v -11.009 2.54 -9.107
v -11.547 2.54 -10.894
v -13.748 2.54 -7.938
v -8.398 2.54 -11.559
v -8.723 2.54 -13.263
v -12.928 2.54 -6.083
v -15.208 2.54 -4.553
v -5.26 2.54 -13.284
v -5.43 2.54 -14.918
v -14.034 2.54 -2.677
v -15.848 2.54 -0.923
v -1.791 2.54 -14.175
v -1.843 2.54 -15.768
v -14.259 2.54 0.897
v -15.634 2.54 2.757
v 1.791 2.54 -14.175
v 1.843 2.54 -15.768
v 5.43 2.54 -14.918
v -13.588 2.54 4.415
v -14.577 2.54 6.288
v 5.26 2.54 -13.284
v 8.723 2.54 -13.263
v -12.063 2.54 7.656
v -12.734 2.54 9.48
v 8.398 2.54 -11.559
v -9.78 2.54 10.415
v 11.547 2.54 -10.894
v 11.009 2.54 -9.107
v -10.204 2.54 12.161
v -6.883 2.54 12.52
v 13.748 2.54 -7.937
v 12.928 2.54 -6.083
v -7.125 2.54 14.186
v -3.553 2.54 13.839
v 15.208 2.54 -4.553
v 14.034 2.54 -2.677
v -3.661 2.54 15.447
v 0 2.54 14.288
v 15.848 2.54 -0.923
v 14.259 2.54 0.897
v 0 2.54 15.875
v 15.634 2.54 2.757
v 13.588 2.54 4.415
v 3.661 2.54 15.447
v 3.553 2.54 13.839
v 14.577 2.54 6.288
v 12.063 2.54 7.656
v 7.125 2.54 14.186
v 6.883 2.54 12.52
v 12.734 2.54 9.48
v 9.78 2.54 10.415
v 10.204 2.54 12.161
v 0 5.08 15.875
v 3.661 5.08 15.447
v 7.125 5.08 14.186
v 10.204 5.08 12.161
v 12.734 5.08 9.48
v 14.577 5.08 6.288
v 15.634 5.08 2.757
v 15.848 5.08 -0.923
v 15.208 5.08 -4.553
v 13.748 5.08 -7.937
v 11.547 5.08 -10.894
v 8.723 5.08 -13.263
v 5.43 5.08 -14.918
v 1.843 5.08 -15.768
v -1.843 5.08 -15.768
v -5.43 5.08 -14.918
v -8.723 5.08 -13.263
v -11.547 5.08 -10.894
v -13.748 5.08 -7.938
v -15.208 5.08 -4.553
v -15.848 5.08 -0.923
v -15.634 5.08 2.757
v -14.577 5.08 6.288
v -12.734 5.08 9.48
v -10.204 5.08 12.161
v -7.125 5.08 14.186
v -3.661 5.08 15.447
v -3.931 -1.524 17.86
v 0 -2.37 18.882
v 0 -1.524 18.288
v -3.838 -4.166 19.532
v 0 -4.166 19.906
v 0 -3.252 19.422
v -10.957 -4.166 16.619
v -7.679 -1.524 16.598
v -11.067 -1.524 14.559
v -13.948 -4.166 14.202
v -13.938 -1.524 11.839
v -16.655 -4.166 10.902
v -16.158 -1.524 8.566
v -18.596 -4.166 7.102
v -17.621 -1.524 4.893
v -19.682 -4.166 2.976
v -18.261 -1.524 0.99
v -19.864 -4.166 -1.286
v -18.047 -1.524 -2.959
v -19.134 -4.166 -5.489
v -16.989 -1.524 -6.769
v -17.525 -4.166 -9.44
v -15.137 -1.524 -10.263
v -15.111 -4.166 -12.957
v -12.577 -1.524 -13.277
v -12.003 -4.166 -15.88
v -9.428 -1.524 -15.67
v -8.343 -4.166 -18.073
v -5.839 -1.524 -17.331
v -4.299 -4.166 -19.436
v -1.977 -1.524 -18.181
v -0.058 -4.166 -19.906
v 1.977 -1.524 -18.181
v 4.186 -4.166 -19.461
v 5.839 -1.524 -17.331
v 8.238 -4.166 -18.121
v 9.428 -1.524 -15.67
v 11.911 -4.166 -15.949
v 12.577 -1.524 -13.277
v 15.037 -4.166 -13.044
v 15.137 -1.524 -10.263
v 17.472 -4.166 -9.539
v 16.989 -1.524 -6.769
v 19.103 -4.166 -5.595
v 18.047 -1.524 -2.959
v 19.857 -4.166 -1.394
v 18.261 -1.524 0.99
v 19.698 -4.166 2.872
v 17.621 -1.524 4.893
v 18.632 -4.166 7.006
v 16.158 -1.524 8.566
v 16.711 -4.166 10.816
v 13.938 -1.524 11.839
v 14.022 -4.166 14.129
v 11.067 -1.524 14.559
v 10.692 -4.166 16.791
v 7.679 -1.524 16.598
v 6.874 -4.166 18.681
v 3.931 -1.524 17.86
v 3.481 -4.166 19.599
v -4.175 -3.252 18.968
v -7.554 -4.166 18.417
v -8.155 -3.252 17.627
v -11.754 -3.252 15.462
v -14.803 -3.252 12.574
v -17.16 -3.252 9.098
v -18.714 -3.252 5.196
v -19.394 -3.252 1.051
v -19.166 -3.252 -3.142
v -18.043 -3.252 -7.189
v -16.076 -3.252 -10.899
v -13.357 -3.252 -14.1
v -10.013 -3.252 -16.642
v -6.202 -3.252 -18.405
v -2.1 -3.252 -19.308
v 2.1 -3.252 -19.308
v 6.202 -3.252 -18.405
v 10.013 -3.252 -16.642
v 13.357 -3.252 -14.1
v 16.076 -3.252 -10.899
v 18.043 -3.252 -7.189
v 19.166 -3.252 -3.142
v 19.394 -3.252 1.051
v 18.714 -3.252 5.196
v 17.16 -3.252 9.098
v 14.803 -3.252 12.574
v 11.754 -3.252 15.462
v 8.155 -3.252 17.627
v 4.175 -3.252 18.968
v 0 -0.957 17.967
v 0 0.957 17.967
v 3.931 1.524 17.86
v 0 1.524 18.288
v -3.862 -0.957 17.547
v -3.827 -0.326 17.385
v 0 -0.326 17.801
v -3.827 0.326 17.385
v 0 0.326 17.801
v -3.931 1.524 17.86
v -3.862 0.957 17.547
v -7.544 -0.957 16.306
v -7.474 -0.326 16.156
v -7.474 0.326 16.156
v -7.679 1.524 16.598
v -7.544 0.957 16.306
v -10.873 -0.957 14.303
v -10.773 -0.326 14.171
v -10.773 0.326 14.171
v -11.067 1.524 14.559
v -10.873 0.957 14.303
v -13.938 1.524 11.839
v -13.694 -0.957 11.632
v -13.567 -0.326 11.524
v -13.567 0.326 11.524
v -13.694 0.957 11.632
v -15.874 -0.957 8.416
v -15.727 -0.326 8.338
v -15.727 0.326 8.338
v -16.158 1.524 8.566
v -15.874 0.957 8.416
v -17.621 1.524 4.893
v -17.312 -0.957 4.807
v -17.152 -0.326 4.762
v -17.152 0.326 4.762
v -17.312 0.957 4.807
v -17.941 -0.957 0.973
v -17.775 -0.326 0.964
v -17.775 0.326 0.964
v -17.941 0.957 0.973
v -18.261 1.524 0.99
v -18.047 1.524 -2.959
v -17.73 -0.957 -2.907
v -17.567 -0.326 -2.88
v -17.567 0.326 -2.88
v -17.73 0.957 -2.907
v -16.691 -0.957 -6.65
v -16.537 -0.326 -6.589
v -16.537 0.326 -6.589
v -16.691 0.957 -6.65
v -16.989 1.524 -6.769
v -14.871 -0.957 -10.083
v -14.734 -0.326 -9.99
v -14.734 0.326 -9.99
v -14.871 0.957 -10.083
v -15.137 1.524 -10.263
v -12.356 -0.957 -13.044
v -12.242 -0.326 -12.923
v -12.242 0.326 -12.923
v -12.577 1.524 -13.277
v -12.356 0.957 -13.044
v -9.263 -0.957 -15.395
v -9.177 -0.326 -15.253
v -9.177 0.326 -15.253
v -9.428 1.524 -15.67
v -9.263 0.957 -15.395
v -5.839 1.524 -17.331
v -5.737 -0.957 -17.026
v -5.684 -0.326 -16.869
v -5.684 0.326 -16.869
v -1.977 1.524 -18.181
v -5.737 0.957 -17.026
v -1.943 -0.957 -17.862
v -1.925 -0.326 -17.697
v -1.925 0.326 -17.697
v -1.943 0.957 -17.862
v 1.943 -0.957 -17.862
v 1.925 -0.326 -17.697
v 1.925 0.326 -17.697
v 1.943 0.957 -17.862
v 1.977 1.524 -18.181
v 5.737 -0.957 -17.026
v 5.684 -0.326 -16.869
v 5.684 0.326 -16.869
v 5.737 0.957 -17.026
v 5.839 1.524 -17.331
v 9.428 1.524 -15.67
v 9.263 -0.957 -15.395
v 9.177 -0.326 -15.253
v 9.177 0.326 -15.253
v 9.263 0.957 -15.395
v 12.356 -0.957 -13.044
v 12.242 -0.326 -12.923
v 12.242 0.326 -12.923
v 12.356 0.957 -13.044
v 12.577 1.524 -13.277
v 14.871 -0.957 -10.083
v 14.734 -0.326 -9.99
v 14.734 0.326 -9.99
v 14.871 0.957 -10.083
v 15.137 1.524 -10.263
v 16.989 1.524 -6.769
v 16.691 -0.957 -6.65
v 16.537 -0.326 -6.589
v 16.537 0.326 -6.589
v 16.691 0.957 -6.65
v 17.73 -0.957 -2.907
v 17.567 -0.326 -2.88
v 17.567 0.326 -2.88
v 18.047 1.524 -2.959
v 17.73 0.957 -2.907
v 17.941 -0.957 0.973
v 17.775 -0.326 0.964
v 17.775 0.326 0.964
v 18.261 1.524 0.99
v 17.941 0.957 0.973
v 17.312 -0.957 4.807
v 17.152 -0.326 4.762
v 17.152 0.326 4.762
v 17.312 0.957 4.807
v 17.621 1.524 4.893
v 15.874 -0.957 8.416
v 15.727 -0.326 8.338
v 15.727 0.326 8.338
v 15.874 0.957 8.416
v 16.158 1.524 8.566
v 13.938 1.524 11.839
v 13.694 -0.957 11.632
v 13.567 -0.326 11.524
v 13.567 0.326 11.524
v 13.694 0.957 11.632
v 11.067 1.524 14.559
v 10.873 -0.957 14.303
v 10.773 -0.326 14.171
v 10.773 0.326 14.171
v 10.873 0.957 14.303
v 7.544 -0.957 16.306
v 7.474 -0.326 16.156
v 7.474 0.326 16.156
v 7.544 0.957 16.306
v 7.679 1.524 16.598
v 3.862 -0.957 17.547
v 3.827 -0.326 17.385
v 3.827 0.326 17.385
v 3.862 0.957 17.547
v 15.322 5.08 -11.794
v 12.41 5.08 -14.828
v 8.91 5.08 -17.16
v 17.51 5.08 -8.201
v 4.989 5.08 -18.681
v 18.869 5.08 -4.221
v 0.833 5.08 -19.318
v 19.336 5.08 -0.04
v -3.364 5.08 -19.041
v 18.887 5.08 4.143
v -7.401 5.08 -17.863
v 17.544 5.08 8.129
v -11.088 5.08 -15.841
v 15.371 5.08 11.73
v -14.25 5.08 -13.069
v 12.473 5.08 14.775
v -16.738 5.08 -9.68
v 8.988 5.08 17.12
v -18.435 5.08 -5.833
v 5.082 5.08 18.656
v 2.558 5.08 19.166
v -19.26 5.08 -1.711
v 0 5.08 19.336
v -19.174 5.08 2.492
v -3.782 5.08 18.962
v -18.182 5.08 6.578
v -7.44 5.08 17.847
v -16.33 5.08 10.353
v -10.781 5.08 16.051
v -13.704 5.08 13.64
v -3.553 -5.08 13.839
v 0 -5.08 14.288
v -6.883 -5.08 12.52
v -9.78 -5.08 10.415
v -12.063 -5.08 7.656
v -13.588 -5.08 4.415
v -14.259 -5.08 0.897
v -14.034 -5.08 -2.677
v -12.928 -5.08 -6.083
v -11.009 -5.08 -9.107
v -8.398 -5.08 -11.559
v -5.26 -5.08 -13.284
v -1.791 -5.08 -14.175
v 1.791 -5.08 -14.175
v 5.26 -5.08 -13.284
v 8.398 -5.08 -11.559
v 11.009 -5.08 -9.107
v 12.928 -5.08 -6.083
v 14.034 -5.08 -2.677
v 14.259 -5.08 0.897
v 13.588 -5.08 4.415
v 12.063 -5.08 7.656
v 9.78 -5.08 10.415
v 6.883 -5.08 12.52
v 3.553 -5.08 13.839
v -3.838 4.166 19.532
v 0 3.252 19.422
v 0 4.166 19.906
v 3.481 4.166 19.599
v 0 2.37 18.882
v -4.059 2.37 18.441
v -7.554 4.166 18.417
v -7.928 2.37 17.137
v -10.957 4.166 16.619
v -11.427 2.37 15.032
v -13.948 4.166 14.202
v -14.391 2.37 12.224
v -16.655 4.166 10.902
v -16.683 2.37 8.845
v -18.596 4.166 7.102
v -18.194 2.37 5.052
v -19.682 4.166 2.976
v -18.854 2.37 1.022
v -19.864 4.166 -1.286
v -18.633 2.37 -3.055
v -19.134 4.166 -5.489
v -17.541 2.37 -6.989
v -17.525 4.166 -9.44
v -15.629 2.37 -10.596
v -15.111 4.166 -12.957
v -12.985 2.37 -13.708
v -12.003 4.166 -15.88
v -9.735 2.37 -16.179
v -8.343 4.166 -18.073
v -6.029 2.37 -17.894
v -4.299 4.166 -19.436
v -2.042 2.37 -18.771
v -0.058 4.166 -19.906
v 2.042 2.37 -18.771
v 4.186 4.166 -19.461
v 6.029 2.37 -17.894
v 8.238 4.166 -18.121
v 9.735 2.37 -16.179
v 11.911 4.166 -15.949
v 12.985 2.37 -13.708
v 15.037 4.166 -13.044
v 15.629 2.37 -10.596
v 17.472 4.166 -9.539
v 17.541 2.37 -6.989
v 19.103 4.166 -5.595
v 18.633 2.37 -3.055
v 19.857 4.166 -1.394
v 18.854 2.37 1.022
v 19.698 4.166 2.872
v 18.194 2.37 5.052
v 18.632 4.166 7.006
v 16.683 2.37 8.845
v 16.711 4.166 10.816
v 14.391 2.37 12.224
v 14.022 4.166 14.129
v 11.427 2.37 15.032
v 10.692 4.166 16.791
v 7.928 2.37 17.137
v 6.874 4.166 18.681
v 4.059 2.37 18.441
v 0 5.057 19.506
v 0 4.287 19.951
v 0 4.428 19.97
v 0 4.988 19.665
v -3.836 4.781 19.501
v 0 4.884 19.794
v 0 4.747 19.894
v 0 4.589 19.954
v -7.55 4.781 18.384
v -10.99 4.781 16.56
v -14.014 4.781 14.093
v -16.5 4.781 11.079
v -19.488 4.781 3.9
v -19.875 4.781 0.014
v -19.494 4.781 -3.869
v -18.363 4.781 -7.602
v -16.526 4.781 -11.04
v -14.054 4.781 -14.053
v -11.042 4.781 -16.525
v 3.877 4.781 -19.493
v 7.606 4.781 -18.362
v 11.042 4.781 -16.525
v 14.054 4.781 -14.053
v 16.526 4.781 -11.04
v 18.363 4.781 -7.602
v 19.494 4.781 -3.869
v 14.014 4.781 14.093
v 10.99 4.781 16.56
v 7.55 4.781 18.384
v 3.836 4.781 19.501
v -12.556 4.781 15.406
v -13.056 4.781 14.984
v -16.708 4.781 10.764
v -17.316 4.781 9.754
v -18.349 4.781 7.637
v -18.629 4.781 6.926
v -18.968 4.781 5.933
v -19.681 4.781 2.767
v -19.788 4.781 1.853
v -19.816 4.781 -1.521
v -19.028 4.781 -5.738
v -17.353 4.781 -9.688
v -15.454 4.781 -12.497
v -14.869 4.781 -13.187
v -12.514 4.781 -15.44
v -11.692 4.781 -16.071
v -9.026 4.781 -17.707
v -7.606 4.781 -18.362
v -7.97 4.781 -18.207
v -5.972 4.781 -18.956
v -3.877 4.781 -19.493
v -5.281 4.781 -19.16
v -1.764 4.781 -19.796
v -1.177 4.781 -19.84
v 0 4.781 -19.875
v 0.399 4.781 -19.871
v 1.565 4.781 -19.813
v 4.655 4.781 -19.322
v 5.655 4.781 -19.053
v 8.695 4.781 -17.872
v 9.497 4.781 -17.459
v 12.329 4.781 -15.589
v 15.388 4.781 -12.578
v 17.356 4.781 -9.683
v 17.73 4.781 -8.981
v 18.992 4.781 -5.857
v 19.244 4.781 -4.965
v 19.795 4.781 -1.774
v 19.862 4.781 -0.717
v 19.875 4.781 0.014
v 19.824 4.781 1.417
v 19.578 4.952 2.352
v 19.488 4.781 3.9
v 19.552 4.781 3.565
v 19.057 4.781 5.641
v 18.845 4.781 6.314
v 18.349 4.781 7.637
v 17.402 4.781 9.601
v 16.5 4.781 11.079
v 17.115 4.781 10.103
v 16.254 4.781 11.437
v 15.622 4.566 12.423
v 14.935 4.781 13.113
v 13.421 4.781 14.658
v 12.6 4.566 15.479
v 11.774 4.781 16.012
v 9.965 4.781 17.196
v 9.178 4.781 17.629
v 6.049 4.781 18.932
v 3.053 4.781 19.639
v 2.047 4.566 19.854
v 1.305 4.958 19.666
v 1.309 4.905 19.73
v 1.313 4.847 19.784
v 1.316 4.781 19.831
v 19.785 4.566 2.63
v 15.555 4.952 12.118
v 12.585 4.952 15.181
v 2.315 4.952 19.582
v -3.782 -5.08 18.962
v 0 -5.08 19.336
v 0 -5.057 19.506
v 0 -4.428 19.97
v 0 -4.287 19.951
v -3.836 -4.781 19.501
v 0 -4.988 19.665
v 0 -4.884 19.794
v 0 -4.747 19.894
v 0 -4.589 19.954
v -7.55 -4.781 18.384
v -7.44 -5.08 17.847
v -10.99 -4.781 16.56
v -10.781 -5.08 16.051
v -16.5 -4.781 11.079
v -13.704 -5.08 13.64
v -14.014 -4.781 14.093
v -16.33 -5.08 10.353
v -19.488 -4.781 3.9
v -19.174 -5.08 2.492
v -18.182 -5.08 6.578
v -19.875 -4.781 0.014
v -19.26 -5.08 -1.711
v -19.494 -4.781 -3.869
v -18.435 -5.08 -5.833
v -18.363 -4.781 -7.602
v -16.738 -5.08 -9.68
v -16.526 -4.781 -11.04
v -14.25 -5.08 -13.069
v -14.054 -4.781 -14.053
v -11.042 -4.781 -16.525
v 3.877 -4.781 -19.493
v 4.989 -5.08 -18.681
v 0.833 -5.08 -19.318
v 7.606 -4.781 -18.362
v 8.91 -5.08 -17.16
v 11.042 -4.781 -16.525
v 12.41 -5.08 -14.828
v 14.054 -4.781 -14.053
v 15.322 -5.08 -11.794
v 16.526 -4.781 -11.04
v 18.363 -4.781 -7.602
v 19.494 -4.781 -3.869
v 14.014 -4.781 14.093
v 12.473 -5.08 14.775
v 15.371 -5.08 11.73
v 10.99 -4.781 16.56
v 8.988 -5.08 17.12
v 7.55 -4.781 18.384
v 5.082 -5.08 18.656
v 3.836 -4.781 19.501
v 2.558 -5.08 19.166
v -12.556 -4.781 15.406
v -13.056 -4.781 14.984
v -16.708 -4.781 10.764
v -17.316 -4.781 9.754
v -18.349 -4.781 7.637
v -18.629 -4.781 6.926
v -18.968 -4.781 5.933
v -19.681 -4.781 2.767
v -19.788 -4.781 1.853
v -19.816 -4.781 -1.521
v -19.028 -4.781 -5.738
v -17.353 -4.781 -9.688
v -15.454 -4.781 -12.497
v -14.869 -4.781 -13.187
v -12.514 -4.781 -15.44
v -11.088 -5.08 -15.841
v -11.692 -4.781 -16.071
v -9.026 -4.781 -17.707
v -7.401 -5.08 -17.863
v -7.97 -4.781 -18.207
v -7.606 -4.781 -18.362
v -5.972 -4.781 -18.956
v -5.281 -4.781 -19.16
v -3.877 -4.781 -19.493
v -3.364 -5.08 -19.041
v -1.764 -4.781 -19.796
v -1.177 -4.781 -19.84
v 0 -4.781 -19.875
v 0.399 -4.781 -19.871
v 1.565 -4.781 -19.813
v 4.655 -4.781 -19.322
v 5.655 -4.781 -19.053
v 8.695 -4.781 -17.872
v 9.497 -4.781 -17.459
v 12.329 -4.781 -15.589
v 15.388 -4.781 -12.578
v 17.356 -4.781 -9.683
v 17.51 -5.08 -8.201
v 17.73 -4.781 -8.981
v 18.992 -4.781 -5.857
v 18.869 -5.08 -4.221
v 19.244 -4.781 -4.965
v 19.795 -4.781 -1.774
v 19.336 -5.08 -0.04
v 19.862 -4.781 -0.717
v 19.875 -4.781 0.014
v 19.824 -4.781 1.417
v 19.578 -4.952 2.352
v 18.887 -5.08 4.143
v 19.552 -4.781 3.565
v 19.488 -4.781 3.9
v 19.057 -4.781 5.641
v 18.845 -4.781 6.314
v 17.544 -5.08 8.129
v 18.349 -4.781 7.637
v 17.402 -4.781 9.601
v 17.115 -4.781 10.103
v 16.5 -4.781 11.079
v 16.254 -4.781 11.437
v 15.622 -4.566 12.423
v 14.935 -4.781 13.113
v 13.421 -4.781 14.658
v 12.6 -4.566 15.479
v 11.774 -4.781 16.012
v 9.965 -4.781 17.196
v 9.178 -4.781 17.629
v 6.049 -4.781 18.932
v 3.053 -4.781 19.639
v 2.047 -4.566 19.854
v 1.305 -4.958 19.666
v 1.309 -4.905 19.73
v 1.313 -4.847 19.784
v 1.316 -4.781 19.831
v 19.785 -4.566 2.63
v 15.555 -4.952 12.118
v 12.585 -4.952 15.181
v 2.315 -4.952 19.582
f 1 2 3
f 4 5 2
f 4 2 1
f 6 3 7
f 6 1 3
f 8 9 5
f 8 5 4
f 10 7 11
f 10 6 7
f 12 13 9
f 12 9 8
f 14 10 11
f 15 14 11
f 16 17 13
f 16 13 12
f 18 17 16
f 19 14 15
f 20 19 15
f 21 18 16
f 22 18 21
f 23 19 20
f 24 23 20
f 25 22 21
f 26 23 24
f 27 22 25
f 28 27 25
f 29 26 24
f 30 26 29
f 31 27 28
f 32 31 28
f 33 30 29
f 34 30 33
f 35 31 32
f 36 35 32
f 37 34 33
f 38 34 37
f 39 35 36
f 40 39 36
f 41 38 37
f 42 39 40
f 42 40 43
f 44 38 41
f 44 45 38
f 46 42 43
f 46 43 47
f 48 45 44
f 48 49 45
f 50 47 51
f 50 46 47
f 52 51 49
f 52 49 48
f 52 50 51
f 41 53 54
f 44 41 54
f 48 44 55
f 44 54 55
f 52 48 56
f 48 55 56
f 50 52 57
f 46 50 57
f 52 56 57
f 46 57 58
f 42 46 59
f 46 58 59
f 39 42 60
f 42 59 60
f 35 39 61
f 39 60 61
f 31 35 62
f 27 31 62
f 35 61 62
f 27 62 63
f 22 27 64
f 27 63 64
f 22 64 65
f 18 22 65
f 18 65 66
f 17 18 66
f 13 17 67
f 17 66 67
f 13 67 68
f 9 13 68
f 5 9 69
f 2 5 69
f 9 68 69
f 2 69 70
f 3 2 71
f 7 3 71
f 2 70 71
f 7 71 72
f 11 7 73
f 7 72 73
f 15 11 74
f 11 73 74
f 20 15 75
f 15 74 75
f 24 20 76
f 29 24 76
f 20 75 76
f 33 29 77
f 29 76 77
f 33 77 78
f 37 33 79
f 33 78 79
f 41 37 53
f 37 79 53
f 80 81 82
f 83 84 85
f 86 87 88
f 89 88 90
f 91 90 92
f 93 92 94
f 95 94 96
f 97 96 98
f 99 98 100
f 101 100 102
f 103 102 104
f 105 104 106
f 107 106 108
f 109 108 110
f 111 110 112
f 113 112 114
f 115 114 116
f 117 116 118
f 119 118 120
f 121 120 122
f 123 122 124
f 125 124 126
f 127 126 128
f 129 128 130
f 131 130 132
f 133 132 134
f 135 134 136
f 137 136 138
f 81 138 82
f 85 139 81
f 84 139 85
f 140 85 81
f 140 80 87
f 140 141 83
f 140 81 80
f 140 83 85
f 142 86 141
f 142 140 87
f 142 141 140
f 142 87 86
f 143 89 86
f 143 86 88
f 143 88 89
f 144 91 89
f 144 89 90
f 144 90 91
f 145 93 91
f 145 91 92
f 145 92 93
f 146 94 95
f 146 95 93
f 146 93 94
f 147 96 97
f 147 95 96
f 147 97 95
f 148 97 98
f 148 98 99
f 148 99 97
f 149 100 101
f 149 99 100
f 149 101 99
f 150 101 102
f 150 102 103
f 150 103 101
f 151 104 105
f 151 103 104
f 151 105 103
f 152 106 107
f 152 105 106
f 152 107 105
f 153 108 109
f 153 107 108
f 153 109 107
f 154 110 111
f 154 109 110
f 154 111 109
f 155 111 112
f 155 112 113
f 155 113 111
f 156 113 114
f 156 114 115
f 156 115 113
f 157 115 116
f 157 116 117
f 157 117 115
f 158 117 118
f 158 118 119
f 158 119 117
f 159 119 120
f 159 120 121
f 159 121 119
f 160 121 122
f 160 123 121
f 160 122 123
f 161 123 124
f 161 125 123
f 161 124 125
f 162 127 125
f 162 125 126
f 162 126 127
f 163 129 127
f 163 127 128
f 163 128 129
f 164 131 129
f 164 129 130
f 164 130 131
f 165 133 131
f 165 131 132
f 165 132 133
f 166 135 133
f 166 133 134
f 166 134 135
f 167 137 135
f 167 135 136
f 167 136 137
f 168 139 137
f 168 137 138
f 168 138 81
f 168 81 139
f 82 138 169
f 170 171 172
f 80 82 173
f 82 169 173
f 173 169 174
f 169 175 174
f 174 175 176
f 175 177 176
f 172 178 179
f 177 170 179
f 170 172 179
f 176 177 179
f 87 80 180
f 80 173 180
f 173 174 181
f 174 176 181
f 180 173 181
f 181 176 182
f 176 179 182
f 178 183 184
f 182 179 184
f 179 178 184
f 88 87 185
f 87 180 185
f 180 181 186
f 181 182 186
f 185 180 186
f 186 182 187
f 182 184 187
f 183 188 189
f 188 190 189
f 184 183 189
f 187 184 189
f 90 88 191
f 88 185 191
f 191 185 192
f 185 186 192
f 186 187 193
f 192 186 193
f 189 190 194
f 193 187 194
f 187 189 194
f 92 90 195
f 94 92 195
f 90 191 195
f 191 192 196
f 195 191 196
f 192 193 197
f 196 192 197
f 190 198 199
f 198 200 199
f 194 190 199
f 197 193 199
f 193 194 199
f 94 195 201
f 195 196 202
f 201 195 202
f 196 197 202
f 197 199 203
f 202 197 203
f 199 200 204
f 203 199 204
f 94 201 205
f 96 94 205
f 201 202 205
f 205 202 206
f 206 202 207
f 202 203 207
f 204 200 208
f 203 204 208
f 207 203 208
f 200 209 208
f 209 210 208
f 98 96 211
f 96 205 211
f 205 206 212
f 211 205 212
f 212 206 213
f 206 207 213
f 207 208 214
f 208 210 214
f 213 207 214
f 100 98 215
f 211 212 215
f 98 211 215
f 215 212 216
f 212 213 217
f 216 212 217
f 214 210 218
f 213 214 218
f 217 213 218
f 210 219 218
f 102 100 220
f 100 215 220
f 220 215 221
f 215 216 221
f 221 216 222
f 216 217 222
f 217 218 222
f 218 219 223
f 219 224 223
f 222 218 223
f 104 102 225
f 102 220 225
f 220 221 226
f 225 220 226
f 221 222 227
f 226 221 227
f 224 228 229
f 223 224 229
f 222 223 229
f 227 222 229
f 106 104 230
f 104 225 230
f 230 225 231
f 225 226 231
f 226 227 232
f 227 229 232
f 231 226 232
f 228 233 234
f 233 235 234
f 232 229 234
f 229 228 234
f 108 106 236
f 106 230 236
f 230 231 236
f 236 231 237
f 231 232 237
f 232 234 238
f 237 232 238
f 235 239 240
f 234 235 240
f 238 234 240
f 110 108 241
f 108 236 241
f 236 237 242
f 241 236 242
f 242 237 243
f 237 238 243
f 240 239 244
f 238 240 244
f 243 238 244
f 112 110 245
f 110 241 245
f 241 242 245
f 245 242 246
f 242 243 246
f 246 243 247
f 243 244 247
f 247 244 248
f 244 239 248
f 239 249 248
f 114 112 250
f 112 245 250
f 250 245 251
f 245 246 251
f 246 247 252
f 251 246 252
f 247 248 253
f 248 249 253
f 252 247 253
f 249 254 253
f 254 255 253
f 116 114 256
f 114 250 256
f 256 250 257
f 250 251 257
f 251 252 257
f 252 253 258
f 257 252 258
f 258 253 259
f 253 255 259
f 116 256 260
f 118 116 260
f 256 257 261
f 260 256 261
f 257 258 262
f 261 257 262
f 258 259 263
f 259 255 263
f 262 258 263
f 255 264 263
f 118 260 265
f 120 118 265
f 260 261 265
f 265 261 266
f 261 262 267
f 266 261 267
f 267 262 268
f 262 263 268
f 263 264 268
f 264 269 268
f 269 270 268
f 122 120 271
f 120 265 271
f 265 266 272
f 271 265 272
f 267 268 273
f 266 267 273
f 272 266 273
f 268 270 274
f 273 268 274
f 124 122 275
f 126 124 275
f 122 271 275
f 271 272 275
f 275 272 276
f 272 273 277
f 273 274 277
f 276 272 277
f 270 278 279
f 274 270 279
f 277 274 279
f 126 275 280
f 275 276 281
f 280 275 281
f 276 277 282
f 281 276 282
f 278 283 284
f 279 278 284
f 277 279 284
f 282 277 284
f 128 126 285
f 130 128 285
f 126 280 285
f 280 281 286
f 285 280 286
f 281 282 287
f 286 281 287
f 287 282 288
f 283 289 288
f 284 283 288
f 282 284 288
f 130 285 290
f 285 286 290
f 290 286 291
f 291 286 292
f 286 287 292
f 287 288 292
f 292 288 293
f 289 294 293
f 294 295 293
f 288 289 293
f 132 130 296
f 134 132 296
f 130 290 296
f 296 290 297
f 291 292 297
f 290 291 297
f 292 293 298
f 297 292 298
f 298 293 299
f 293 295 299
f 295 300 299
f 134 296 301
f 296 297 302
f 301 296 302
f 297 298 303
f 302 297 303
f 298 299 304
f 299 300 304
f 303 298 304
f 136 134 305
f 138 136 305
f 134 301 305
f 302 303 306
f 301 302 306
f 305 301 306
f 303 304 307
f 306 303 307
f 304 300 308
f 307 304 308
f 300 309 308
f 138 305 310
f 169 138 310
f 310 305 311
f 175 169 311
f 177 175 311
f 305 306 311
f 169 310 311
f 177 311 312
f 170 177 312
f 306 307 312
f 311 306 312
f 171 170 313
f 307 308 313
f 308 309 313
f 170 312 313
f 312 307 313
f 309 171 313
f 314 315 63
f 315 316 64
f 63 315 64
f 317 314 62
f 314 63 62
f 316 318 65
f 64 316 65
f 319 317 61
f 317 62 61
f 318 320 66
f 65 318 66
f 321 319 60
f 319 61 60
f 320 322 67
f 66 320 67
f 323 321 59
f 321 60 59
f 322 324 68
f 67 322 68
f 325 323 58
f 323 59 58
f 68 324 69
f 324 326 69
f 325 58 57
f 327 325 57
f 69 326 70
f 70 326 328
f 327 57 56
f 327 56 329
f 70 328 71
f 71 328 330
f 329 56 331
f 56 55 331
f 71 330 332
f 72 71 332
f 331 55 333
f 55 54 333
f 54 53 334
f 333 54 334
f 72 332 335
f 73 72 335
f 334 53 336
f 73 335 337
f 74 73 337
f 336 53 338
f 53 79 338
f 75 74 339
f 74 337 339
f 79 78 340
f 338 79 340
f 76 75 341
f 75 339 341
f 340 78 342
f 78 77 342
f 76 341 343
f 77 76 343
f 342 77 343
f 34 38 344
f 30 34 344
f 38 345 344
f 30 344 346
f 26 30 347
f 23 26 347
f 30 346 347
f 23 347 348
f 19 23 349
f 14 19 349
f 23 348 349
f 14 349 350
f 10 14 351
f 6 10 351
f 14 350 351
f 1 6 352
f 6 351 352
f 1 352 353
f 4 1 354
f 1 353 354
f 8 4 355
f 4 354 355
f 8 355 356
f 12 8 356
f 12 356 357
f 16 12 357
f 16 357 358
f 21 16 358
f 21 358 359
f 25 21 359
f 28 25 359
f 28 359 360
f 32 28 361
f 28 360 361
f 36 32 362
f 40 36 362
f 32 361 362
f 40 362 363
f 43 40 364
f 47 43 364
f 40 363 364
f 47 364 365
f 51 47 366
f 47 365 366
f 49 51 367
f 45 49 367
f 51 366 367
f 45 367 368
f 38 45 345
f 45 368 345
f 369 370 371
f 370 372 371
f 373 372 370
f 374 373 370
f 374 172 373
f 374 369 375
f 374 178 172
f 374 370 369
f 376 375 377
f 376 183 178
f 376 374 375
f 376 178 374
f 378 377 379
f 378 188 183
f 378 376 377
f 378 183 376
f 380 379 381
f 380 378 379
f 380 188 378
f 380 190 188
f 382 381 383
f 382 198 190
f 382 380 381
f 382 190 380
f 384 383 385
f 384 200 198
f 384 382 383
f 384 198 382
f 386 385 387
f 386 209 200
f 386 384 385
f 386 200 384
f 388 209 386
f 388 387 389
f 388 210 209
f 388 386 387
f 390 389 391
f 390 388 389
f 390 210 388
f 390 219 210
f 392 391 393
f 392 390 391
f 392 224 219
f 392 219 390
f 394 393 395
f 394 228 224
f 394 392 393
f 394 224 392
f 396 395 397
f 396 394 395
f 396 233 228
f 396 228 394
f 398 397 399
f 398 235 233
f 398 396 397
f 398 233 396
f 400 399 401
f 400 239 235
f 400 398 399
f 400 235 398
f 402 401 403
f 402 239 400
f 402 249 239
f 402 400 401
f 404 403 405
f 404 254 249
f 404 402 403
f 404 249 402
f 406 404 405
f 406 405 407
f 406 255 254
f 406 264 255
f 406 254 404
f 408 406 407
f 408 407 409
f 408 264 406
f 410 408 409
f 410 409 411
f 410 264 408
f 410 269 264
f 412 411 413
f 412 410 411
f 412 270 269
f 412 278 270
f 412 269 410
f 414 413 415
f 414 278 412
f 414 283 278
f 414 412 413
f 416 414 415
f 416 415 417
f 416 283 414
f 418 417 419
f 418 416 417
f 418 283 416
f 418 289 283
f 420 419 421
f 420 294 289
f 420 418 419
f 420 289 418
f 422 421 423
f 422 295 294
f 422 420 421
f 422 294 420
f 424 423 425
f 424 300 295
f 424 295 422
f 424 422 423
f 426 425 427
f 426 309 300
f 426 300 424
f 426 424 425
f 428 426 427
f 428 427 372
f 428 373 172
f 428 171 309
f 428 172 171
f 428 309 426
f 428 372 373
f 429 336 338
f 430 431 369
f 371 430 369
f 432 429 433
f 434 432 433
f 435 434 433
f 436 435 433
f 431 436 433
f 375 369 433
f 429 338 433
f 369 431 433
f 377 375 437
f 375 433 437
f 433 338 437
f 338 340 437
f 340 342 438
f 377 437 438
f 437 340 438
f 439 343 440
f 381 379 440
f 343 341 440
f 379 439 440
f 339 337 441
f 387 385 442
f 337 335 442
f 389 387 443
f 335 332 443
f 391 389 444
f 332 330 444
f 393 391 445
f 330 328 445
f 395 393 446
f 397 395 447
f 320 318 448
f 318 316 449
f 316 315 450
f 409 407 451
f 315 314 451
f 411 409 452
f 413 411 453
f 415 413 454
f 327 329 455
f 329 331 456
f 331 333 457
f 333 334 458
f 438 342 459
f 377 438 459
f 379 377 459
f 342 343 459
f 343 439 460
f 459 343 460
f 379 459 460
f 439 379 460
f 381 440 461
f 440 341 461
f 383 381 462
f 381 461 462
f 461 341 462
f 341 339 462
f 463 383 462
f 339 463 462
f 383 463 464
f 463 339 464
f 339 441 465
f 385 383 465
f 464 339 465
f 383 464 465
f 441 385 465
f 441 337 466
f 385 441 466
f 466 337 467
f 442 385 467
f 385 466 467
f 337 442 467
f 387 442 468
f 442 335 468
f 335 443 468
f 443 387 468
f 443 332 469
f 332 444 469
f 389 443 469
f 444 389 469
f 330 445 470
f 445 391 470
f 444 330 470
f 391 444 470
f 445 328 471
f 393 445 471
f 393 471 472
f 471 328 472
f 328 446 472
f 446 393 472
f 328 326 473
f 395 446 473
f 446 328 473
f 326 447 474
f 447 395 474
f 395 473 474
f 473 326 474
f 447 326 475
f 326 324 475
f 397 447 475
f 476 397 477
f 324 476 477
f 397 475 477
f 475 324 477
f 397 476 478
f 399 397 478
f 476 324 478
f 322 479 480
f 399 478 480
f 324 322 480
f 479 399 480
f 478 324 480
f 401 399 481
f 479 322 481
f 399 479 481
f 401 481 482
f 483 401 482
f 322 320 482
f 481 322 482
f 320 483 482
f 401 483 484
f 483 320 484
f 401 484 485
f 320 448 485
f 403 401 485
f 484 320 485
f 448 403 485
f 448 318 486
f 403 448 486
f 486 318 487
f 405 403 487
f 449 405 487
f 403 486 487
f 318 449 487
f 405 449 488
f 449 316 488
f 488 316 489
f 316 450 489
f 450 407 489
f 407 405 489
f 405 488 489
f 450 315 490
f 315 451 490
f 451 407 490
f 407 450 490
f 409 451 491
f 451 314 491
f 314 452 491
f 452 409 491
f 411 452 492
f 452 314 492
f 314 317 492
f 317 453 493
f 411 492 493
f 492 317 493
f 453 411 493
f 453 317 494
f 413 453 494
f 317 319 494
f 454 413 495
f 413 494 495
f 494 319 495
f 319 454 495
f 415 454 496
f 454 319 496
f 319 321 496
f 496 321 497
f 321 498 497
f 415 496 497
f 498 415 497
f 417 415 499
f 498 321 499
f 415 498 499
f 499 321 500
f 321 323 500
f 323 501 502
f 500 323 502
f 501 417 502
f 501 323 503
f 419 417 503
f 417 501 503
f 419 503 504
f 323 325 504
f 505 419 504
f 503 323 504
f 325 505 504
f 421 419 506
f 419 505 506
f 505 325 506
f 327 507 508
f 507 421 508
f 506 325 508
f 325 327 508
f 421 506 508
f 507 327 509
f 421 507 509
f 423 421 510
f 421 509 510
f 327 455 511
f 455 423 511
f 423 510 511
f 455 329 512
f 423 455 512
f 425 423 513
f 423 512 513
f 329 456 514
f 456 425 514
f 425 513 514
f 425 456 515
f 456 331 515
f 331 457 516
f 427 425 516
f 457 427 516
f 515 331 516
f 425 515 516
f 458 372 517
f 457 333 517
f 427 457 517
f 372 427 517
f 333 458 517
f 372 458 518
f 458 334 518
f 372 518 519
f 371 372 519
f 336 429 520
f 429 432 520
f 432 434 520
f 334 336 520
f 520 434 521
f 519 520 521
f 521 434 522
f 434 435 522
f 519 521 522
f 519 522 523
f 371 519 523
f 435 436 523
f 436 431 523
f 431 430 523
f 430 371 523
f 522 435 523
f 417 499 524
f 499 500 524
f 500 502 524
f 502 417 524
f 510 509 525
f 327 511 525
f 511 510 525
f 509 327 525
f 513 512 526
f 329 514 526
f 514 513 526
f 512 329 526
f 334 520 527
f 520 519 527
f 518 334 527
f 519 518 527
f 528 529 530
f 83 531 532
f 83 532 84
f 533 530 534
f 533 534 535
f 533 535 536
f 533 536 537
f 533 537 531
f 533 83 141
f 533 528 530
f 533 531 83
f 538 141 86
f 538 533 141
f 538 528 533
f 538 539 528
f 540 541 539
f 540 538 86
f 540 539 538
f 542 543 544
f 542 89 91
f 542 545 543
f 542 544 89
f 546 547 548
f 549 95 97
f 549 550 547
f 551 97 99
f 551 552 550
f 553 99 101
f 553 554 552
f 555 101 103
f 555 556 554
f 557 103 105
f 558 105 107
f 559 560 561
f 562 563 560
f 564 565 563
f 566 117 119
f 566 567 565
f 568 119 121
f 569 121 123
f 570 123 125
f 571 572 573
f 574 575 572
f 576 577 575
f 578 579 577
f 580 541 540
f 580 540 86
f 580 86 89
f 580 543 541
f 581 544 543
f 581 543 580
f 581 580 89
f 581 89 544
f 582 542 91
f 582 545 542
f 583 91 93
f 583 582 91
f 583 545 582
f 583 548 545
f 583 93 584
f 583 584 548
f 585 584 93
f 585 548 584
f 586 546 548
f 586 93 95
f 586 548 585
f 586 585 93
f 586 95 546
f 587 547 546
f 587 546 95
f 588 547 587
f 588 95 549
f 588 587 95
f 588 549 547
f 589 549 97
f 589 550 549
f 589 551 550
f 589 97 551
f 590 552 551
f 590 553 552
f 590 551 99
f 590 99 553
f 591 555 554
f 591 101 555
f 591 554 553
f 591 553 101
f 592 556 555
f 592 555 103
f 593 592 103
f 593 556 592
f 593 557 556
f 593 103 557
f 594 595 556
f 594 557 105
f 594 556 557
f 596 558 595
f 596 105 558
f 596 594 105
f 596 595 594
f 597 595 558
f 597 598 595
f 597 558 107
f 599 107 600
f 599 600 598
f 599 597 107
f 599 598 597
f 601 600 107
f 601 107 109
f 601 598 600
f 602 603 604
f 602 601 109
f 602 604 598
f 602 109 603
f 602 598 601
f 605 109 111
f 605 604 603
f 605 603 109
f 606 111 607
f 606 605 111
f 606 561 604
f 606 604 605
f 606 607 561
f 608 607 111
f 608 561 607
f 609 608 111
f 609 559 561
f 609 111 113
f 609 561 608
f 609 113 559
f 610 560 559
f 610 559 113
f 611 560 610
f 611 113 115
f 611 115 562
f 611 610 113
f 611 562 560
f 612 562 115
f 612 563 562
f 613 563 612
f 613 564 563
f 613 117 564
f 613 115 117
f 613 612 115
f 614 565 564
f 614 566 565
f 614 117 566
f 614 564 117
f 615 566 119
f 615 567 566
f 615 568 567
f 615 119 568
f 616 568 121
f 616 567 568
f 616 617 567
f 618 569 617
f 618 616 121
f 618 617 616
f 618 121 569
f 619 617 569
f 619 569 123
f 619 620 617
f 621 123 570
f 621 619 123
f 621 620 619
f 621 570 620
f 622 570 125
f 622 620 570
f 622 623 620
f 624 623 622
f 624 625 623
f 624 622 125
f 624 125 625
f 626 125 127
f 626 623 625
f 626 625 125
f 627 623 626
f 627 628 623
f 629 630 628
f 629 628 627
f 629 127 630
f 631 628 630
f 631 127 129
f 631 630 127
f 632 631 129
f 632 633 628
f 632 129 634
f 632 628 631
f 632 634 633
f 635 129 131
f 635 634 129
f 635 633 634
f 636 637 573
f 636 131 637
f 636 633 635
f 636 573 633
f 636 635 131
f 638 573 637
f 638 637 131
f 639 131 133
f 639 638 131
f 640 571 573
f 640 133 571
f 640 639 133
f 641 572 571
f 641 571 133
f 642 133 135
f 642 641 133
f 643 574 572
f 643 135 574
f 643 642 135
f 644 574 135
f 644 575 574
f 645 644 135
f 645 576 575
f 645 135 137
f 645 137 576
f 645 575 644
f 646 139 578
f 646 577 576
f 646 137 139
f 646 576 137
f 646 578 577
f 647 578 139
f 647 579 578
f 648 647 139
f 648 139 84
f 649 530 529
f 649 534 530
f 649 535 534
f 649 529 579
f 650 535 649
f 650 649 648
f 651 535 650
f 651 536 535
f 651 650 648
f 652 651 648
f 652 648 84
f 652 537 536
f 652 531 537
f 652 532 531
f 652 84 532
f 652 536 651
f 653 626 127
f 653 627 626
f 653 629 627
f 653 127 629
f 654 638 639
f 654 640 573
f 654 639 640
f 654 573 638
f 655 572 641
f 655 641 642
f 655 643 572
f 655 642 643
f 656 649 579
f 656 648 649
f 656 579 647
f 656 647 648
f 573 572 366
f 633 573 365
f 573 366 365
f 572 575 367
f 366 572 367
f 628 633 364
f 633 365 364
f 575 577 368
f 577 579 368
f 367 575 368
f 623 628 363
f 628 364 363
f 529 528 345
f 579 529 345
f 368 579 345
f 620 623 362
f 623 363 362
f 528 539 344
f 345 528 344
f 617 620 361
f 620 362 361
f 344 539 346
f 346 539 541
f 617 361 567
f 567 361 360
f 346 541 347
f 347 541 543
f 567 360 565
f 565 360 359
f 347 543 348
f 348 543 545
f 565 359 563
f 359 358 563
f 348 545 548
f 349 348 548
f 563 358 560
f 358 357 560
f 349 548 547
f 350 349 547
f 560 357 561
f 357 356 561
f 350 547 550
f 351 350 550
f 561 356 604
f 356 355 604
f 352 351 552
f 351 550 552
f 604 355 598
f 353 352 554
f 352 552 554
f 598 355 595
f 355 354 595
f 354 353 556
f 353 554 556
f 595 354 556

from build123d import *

# Parameters (mm, degrees)
FILLET1_R          = 16.51
FILLET2_R          = 0.635
SKETCH2_R          = 15.875
CUT_EXTRUDE1_DEPTH = 2.54


with BuildPart() as part:
    # Sketch1 → Revolve1 (revolve)
    with BuildSketch(Plane.XY, mode=Mode.PRIVATE) as revolve1_sk:
        with BuildLine():
            Line((14.2875, 5.08), (14.2875, -5.08))
            Line((14.2875, -5.08), (20.32, -5.08))
            Line((20.32, -5.08), (20.32, -2.54))
            ThreePointArc((20.32, -2.54), (17.78, 0), (20.32, 2.54))
            Line((20.32, 2.54), (20.32, 5.08))
            Line((20.32, 5.08), (14.2875, 5.08))
        make_face()
    revolve(revolve1_sk.sketch.rotate(Axis((0, 5.08, 0), (0, -1, 0)), 90), axis=Axis((0, 5.08, 0), (0, -1, 0)))

    # Fillet1
    # the kernel refuses this fillet: 16.51 mm, written as the material it takes off along each edge
    with BuildSketch(Plane(origin=(0, 2.54, 0), x_dir=(0, 0, 1), z_dir=(1, 0, 0))) as fillet1_piece_1:
        with BuildLine():
            CenterArc((5.08, -8.89), FILLET1_R, 22.619864948, 14.250032698)
            Line((18.288, 1.016), (18.55216, 1.21412))
            ThreePointArc((18.55216, 1.21412), (19.331747397, 0.563494793), (20.32, 0.3302))
            Line((20.32, 0.3302), (20.6502, 0))
            ThreePointArc((20.6502, 0), (20.6502, -1.27), (20.6248, -2.413))
            Line((20.6248, -2.413), (20.32, -2.54))
        make_face()
    revolve(axis=Axis((0, 2.54, 0), (0, -1, 0)), mode=Mode.SUBTRACT)
    with BuildSketch(Plane(origin=(0, -2.54, 0), x_dir=(0, 0, 1), z_dir=(1, 0, 0))) as fillet1_piece_2:
        with BuildLine():
            CenterArc((5.08, 8.89), FILLET1_R, 323.130102354, 14.250032698)
            Line((18.288, -1.016), (18.55216, -1.21412))
            ThreePointArc((18.55216, -1.21412), (19.331747397, -0.563494793), (20.32, -0.3302))
            Line((20.32, -0.3302), (20.6502, 0))
            ThreePointArc((20.6502, 0), (20.6502, 1.27), (20.6248, 2.413))
            Line((20.6248, 2.413), (20.32, 2.54))
        make_face()
    revolve(axis=Axis((0, -2.54, 0), (0, -1, 0)), mode=Mode.SUBTRACT)

    # Fillet2
    fillet2_edges = [part.edges().sort_by_distance(p)[0] for p in [
        (0, 5.08, -20.32),
        (0, -5.08, -20.32),
    ]]
    fillet(fillet2_edges, radius=FILLET2_R)

    # Sketch2 → Cut-Extrude1 (cut)
    with BuildSketch(Plane(origin=(0, 5.08, 0), x_dir=(1, 0, 0), z_dir=(0, 1, 0))):
        with Locations(Location((0, 0, 0), (0, 0, 270))):
            Circle(SKETCH2_R)
    extrude(amount=-CUT_EXTRUDE1_DEPTH, mode=Mode.SUBTRACT)


solid = part.part
